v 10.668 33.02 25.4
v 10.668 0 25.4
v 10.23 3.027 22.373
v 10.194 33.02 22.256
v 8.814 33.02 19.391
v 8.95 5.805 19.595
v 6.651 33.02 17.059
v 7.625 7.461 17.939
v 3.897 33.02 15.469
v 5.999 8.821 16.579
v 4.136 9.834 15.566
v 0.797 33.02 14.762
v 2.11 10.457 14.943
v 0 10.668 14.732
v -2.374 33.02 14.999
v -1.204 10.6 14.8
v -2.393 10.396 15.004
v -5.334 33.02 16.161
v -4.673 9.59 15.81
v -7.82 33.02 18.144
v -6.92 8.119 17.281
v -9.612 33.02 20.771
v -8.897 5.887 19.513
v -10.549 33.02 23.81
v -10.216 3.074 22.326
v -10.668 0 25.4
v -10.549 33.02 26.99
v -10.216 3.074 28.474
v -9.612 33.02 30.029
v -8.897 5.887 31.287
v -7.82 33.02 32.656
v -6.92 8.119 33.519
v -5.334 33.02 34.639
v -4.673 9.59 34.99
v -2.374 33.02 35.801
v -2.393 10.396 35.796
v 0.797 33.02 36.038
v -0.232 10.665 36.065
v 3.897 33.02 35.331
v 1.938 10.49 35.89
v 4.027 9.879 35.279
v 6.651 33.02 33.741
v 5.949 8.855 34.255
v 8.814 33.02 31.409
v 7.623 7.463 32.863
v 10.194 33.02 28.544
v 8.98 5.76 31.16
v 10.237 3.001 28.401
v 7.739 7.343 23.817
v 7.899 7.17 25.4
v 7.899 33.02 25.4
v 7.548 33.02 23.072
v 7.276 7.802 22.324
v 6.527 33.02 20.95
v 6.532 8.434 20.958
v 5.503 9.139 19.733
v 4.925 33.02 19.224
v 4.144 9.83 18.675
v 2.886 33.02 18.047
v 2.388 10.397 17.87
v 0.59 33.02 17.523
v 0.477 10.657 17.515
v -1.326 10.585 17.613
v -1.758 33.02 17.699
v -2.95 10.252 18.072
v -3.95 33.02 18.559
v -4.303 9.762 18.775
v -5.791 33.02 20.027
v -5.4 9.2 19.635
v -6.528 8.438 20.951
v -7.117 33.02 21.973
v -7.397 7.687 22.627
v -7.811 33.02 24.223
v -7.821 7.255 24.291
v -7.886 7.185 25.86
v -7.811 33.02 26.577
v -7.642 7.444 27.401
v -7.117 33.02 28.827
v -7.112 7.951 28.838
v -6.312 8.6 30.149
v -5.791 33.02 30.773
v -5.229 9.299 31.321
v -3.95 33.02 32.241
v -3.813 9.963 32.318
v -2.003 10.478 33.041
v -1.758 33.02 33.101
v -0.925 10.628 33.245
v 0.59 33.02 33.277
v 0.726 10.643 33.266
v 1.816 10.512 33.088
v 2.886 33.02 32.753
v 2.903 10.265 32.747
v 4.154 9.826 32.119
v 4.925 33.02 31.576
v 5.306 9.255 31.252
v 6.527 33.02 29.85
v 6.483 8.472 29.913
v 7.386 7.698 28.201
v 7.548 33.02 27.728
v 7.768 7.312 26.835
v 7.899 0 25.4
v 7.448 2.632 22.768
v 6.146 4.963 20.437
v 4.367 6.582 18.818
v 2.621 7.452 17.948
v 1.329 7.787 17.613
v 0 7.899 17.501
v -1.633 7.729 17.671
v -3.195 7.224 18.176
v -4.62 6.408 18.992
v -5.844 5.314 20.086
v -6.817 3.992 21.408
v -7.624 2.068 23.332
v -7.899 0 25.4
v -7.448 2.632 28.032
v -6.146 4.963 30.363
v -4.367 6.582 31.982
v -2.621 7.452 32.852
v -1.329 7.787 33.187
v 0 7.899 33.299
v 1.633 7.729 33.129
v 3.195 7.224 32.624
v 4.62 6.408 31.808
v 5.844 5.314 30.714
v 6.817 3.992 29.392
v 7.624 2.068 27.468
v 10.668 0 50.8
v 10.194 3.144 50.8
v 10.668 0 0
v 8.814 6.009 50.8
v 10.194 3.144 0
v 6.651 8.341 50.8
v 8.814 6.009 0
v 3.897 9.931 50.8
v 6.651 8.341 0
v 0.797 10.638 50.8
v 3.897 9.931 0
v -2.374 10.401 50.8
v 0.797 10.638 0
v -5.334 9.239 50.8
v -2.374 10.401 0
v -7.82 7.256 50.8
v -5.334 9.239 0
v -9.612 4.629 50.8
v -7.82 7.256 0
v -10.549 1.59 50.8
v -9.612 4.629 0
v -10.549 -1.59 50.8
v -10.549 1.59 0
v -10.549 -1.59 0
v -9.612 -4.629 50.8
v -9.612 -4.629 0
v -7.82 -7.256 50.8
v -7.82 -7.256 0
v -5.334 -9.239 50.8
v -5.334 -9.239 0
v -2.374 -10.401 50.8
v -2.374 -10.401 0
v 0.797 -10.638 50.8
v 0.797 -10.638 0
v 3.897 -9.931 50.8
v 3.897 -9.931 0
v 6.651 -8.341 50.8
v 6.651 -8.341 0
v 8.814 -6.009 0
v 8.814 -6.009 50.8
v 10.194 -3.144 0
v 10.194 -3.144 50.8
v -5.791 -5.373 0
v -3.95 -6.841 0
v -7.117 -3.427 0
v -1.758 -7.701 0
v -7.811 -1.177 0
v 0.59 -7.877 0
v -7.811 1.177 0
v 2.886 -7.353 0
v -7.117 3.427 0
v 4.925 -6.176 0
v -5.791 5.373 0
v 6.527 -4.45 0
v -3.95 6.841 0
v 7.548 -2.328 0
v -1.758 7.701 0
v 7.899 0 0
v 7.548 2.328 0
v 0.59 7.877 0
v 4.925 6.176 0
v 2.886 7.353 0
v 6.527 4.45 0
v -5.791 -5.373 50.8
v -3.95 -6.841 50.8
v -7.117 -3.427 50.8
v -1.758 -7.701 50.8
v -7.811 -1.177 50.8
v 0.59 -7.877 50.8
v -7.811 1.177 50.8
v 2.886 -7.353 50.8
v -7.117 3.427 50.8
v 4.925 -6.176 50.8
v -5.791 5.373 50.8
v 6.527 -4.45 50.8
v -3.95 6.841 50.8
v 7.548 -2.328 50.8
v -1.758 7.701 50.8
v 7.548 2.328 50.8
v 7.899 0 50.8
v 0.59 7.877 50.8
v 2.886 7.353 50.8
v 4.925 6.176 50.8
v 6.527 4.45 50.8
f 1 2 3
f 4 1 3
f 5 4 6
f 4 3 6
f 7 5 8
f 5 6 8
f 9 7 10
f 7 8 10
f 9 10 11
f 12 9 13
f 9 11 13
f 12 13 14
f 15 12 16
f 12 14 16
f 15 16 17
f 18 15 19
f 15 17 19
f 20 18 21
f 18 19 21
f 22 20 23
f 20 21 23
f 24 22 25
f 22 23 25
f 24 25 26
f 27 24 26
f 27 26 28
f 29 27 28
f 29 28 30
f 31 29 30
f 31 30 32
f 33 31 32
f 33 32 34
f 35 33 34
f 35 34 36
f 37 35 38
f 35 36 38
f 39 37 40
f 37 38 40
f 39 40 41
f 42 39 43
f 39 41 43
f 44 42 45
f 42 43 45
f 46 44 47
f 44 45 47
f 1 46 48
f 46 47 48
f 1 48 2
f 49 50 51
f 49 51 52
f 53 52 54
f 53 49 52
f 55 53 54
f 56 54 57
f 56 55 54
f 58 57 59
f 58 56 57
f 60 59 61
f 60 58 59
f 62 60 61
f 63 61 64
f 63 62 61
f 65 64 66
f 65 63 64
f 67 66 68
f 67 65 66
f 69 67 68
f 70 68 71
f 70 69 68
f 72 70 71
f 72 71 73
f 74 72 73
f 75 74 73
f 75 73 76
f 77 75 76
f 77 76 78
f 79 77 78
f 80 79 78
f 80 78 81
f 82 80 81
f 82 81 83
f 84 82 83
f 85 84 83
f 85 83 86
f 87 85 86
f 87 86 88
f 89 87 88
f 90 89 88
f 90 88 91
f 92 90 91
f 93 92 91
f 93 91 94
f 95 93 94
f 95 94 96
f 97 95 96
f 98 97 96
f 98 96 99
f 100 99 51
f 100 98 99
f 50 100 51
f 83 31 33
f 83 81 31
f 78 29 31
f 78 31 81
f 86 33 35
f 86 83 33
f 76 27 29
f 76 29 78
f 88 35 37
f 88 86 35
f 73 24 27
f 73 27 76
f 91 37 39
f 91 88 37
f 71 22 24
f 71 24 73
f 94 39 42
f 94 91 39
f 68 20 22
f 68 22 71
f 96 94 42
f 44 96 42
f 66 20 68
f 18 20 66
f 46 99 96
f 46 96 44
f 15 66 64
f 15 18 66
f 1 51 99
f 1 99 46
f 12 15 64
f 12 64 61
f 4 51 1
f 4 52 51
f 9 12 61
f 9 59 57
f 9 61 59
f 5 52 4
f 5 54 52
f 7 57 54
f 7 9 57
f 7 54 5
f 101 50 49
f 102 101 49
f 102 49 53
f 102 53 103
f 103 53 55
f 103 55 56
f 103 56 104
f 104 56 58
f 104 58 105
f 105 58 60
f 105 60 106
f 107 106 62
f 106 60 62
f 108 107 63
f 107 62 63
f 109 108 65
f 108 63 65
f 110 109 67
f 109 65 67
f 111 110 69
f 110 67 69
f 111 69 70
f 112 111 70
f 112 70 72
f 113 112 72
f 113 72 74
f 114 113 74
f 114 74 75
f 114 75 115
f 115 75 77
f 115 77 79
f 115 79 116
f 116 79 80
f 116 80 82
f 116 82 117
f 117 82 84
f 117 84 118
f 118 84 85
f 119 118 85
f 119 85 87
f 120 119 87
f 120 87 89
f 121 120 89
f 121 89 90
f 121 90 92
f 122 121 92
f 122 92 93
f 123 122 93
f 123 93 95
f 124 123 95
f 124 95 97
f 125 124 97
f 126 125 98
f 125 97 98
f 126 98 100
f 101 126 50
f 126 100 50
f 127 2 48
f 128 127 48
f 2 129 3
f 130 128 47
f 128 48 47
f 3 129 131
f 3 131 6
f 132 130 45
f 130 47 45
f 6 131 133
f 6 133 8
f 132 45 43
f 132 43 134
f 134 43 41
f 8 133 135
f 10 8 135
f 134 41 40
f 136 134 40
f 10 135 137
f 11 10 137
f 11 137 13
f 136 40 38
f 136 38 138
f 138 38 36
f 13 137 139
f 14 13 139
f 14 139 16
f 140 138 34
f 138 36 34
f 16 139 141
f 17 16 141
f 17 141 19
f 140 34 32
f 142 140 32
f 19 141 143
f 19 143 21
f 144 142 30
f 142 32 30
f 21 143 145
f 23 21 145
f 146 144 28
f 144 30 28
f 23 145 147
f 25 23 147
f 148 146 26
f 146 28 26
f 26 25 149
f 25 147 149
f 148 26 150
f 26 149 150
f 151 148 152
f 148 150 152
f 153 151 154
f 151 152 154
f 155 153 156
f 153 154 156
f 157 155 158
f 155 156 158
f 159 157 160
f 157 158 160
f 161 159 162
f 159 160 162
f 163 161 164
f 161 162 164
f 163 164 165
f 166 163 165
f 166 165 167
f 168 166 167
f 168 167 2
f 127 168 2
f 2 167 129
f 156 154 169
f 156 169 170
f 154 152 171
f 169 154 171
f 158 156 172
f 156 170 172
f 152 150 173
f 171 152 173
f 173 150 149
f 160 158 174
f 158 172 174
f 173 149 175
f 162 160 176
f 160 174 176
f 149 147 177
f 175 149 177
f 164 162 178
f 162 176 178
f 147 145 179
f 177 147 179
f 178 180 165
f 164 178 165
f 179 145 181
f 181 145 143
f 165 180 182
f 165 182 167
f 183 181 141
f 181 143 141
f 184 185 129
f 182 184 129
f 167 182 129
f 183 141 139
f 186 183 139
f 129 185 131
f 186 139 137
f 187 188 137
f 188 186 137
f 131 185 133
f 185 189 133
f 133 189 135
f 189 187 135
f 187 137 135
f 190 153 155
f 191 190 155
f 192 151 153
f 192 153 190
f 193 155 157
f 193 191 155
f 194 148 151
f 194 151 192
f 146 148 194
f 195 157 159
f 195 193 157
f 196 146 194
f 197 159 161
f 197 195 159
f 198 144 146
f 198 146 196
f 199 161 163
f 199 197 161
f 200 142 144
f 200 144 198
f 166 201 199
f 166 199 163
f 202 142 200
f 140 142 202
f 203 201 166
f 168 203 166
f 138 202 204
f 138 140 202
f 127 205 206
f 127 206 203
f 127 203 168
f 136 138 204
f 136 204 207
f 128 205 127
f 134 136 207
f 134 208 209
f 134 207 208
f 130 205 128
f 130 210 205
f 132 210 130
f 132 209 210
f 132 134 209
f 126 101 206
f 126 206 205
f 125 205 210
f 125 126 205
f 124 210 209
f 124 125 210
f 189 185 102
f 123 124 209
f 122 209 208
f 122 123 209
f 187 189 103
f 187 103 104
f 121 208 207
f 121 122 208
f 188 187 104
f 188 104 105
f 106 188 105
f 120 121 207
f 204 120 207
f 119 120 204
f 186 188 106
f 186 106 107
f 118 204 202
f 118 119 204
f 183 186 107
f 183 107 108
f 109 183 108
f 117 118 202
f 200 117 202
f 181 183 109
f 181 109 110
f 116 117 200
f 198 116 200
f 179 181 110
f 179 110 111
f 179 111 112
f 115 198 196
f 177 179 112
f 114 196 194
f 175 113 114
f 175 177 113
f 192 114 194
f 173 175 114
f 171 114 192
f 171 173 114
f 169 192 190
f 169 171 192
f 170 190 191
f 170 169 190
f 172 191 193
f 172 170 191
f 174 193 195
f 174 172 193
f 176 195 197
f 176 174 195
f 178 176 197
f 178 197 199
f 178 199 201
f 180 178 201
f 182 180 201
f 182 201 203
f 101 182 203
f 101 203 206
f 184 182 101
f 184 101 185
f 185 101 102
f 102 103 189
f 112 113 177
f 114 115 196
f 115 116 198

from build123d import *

# Parameters (mm, degrees)
SKETCH1_R           = 10.668
SKETCH1_R_2         = 7.8994
BOSS_EXTRUDE1_DEPTH = 50.8
SKETCH2_R           = 10.668
SKETCH2_R_2         = 7.8994
BOSS_EXTRUDE2_DEPTH = 33.02
SKETCH3_R           = 7.8994
CUT_EXTRUDE1_DEPTH  = 51.8000001
CUT_EXTRUDE2_REACH  = 45.688
SKETCH4_R           = 7.8994


with BuildPart() as part:
    # Sketch1 → Boss-Extrude1 (new body)
    with BuildSketch(Plane.XY):
        Circle(SKETCH1_R)
        Circle(SKETCH1_R_2, mode=Mode.SUBTRACT)
    extrude(amount=BOSS_EXTRUDE1_DEPTH)

    # Sketch2 → Boss-Extrude2 (add)
    with BuildSketch(Plane(origin=(0, 0, 0), x_dir=(1, 0, 0), z_dir=(0, 1, 0))):
        with Locations((0, -25.4)):
            Circle(SKETCH2_R)
        with Locations((0, -25.4)):
            Circle(SKETCH2_R_2, mode=Mode.SUBTRACT)
    extrude(amount=BOSS_EXTRUDE2_DEPTH)

    # Sketch3 → Cut-Extrude1 (cut, through all)
    with BuildSketch(Plane.XY.offset(50.8)):
        Circle(SKETCH3_R)
    extrude(amount=-CUT_EXTRUDE1_DEPTH, mode=Mode.SUBTRACT)

    # Sketch4 → Cut-Extrude2 (cut, up to next)
    with BuildSketch(Plane(origin=(0, 33.02, 0), x_dir=(1, 0, 0), z_dir=(0, 1, 0)), mode=Mode.PRIVATE) as cut_extrude2_sk1:
        with Locations((0, -25.4)):
            Circle(SKETCH4_R)
    cut_extrude2_tool1 = extrude(cut_extrude2_sk1.sketch, amount=-CUT_EXTRUDE2_REACH, mode=Mode.PRIVATE) & part.part
    add(cut_extrude2_tool1.solids().sort_by_distance((0, 33.02, 25.4))[0], mode=Mode.SUBTRACT)


solid = part.part
